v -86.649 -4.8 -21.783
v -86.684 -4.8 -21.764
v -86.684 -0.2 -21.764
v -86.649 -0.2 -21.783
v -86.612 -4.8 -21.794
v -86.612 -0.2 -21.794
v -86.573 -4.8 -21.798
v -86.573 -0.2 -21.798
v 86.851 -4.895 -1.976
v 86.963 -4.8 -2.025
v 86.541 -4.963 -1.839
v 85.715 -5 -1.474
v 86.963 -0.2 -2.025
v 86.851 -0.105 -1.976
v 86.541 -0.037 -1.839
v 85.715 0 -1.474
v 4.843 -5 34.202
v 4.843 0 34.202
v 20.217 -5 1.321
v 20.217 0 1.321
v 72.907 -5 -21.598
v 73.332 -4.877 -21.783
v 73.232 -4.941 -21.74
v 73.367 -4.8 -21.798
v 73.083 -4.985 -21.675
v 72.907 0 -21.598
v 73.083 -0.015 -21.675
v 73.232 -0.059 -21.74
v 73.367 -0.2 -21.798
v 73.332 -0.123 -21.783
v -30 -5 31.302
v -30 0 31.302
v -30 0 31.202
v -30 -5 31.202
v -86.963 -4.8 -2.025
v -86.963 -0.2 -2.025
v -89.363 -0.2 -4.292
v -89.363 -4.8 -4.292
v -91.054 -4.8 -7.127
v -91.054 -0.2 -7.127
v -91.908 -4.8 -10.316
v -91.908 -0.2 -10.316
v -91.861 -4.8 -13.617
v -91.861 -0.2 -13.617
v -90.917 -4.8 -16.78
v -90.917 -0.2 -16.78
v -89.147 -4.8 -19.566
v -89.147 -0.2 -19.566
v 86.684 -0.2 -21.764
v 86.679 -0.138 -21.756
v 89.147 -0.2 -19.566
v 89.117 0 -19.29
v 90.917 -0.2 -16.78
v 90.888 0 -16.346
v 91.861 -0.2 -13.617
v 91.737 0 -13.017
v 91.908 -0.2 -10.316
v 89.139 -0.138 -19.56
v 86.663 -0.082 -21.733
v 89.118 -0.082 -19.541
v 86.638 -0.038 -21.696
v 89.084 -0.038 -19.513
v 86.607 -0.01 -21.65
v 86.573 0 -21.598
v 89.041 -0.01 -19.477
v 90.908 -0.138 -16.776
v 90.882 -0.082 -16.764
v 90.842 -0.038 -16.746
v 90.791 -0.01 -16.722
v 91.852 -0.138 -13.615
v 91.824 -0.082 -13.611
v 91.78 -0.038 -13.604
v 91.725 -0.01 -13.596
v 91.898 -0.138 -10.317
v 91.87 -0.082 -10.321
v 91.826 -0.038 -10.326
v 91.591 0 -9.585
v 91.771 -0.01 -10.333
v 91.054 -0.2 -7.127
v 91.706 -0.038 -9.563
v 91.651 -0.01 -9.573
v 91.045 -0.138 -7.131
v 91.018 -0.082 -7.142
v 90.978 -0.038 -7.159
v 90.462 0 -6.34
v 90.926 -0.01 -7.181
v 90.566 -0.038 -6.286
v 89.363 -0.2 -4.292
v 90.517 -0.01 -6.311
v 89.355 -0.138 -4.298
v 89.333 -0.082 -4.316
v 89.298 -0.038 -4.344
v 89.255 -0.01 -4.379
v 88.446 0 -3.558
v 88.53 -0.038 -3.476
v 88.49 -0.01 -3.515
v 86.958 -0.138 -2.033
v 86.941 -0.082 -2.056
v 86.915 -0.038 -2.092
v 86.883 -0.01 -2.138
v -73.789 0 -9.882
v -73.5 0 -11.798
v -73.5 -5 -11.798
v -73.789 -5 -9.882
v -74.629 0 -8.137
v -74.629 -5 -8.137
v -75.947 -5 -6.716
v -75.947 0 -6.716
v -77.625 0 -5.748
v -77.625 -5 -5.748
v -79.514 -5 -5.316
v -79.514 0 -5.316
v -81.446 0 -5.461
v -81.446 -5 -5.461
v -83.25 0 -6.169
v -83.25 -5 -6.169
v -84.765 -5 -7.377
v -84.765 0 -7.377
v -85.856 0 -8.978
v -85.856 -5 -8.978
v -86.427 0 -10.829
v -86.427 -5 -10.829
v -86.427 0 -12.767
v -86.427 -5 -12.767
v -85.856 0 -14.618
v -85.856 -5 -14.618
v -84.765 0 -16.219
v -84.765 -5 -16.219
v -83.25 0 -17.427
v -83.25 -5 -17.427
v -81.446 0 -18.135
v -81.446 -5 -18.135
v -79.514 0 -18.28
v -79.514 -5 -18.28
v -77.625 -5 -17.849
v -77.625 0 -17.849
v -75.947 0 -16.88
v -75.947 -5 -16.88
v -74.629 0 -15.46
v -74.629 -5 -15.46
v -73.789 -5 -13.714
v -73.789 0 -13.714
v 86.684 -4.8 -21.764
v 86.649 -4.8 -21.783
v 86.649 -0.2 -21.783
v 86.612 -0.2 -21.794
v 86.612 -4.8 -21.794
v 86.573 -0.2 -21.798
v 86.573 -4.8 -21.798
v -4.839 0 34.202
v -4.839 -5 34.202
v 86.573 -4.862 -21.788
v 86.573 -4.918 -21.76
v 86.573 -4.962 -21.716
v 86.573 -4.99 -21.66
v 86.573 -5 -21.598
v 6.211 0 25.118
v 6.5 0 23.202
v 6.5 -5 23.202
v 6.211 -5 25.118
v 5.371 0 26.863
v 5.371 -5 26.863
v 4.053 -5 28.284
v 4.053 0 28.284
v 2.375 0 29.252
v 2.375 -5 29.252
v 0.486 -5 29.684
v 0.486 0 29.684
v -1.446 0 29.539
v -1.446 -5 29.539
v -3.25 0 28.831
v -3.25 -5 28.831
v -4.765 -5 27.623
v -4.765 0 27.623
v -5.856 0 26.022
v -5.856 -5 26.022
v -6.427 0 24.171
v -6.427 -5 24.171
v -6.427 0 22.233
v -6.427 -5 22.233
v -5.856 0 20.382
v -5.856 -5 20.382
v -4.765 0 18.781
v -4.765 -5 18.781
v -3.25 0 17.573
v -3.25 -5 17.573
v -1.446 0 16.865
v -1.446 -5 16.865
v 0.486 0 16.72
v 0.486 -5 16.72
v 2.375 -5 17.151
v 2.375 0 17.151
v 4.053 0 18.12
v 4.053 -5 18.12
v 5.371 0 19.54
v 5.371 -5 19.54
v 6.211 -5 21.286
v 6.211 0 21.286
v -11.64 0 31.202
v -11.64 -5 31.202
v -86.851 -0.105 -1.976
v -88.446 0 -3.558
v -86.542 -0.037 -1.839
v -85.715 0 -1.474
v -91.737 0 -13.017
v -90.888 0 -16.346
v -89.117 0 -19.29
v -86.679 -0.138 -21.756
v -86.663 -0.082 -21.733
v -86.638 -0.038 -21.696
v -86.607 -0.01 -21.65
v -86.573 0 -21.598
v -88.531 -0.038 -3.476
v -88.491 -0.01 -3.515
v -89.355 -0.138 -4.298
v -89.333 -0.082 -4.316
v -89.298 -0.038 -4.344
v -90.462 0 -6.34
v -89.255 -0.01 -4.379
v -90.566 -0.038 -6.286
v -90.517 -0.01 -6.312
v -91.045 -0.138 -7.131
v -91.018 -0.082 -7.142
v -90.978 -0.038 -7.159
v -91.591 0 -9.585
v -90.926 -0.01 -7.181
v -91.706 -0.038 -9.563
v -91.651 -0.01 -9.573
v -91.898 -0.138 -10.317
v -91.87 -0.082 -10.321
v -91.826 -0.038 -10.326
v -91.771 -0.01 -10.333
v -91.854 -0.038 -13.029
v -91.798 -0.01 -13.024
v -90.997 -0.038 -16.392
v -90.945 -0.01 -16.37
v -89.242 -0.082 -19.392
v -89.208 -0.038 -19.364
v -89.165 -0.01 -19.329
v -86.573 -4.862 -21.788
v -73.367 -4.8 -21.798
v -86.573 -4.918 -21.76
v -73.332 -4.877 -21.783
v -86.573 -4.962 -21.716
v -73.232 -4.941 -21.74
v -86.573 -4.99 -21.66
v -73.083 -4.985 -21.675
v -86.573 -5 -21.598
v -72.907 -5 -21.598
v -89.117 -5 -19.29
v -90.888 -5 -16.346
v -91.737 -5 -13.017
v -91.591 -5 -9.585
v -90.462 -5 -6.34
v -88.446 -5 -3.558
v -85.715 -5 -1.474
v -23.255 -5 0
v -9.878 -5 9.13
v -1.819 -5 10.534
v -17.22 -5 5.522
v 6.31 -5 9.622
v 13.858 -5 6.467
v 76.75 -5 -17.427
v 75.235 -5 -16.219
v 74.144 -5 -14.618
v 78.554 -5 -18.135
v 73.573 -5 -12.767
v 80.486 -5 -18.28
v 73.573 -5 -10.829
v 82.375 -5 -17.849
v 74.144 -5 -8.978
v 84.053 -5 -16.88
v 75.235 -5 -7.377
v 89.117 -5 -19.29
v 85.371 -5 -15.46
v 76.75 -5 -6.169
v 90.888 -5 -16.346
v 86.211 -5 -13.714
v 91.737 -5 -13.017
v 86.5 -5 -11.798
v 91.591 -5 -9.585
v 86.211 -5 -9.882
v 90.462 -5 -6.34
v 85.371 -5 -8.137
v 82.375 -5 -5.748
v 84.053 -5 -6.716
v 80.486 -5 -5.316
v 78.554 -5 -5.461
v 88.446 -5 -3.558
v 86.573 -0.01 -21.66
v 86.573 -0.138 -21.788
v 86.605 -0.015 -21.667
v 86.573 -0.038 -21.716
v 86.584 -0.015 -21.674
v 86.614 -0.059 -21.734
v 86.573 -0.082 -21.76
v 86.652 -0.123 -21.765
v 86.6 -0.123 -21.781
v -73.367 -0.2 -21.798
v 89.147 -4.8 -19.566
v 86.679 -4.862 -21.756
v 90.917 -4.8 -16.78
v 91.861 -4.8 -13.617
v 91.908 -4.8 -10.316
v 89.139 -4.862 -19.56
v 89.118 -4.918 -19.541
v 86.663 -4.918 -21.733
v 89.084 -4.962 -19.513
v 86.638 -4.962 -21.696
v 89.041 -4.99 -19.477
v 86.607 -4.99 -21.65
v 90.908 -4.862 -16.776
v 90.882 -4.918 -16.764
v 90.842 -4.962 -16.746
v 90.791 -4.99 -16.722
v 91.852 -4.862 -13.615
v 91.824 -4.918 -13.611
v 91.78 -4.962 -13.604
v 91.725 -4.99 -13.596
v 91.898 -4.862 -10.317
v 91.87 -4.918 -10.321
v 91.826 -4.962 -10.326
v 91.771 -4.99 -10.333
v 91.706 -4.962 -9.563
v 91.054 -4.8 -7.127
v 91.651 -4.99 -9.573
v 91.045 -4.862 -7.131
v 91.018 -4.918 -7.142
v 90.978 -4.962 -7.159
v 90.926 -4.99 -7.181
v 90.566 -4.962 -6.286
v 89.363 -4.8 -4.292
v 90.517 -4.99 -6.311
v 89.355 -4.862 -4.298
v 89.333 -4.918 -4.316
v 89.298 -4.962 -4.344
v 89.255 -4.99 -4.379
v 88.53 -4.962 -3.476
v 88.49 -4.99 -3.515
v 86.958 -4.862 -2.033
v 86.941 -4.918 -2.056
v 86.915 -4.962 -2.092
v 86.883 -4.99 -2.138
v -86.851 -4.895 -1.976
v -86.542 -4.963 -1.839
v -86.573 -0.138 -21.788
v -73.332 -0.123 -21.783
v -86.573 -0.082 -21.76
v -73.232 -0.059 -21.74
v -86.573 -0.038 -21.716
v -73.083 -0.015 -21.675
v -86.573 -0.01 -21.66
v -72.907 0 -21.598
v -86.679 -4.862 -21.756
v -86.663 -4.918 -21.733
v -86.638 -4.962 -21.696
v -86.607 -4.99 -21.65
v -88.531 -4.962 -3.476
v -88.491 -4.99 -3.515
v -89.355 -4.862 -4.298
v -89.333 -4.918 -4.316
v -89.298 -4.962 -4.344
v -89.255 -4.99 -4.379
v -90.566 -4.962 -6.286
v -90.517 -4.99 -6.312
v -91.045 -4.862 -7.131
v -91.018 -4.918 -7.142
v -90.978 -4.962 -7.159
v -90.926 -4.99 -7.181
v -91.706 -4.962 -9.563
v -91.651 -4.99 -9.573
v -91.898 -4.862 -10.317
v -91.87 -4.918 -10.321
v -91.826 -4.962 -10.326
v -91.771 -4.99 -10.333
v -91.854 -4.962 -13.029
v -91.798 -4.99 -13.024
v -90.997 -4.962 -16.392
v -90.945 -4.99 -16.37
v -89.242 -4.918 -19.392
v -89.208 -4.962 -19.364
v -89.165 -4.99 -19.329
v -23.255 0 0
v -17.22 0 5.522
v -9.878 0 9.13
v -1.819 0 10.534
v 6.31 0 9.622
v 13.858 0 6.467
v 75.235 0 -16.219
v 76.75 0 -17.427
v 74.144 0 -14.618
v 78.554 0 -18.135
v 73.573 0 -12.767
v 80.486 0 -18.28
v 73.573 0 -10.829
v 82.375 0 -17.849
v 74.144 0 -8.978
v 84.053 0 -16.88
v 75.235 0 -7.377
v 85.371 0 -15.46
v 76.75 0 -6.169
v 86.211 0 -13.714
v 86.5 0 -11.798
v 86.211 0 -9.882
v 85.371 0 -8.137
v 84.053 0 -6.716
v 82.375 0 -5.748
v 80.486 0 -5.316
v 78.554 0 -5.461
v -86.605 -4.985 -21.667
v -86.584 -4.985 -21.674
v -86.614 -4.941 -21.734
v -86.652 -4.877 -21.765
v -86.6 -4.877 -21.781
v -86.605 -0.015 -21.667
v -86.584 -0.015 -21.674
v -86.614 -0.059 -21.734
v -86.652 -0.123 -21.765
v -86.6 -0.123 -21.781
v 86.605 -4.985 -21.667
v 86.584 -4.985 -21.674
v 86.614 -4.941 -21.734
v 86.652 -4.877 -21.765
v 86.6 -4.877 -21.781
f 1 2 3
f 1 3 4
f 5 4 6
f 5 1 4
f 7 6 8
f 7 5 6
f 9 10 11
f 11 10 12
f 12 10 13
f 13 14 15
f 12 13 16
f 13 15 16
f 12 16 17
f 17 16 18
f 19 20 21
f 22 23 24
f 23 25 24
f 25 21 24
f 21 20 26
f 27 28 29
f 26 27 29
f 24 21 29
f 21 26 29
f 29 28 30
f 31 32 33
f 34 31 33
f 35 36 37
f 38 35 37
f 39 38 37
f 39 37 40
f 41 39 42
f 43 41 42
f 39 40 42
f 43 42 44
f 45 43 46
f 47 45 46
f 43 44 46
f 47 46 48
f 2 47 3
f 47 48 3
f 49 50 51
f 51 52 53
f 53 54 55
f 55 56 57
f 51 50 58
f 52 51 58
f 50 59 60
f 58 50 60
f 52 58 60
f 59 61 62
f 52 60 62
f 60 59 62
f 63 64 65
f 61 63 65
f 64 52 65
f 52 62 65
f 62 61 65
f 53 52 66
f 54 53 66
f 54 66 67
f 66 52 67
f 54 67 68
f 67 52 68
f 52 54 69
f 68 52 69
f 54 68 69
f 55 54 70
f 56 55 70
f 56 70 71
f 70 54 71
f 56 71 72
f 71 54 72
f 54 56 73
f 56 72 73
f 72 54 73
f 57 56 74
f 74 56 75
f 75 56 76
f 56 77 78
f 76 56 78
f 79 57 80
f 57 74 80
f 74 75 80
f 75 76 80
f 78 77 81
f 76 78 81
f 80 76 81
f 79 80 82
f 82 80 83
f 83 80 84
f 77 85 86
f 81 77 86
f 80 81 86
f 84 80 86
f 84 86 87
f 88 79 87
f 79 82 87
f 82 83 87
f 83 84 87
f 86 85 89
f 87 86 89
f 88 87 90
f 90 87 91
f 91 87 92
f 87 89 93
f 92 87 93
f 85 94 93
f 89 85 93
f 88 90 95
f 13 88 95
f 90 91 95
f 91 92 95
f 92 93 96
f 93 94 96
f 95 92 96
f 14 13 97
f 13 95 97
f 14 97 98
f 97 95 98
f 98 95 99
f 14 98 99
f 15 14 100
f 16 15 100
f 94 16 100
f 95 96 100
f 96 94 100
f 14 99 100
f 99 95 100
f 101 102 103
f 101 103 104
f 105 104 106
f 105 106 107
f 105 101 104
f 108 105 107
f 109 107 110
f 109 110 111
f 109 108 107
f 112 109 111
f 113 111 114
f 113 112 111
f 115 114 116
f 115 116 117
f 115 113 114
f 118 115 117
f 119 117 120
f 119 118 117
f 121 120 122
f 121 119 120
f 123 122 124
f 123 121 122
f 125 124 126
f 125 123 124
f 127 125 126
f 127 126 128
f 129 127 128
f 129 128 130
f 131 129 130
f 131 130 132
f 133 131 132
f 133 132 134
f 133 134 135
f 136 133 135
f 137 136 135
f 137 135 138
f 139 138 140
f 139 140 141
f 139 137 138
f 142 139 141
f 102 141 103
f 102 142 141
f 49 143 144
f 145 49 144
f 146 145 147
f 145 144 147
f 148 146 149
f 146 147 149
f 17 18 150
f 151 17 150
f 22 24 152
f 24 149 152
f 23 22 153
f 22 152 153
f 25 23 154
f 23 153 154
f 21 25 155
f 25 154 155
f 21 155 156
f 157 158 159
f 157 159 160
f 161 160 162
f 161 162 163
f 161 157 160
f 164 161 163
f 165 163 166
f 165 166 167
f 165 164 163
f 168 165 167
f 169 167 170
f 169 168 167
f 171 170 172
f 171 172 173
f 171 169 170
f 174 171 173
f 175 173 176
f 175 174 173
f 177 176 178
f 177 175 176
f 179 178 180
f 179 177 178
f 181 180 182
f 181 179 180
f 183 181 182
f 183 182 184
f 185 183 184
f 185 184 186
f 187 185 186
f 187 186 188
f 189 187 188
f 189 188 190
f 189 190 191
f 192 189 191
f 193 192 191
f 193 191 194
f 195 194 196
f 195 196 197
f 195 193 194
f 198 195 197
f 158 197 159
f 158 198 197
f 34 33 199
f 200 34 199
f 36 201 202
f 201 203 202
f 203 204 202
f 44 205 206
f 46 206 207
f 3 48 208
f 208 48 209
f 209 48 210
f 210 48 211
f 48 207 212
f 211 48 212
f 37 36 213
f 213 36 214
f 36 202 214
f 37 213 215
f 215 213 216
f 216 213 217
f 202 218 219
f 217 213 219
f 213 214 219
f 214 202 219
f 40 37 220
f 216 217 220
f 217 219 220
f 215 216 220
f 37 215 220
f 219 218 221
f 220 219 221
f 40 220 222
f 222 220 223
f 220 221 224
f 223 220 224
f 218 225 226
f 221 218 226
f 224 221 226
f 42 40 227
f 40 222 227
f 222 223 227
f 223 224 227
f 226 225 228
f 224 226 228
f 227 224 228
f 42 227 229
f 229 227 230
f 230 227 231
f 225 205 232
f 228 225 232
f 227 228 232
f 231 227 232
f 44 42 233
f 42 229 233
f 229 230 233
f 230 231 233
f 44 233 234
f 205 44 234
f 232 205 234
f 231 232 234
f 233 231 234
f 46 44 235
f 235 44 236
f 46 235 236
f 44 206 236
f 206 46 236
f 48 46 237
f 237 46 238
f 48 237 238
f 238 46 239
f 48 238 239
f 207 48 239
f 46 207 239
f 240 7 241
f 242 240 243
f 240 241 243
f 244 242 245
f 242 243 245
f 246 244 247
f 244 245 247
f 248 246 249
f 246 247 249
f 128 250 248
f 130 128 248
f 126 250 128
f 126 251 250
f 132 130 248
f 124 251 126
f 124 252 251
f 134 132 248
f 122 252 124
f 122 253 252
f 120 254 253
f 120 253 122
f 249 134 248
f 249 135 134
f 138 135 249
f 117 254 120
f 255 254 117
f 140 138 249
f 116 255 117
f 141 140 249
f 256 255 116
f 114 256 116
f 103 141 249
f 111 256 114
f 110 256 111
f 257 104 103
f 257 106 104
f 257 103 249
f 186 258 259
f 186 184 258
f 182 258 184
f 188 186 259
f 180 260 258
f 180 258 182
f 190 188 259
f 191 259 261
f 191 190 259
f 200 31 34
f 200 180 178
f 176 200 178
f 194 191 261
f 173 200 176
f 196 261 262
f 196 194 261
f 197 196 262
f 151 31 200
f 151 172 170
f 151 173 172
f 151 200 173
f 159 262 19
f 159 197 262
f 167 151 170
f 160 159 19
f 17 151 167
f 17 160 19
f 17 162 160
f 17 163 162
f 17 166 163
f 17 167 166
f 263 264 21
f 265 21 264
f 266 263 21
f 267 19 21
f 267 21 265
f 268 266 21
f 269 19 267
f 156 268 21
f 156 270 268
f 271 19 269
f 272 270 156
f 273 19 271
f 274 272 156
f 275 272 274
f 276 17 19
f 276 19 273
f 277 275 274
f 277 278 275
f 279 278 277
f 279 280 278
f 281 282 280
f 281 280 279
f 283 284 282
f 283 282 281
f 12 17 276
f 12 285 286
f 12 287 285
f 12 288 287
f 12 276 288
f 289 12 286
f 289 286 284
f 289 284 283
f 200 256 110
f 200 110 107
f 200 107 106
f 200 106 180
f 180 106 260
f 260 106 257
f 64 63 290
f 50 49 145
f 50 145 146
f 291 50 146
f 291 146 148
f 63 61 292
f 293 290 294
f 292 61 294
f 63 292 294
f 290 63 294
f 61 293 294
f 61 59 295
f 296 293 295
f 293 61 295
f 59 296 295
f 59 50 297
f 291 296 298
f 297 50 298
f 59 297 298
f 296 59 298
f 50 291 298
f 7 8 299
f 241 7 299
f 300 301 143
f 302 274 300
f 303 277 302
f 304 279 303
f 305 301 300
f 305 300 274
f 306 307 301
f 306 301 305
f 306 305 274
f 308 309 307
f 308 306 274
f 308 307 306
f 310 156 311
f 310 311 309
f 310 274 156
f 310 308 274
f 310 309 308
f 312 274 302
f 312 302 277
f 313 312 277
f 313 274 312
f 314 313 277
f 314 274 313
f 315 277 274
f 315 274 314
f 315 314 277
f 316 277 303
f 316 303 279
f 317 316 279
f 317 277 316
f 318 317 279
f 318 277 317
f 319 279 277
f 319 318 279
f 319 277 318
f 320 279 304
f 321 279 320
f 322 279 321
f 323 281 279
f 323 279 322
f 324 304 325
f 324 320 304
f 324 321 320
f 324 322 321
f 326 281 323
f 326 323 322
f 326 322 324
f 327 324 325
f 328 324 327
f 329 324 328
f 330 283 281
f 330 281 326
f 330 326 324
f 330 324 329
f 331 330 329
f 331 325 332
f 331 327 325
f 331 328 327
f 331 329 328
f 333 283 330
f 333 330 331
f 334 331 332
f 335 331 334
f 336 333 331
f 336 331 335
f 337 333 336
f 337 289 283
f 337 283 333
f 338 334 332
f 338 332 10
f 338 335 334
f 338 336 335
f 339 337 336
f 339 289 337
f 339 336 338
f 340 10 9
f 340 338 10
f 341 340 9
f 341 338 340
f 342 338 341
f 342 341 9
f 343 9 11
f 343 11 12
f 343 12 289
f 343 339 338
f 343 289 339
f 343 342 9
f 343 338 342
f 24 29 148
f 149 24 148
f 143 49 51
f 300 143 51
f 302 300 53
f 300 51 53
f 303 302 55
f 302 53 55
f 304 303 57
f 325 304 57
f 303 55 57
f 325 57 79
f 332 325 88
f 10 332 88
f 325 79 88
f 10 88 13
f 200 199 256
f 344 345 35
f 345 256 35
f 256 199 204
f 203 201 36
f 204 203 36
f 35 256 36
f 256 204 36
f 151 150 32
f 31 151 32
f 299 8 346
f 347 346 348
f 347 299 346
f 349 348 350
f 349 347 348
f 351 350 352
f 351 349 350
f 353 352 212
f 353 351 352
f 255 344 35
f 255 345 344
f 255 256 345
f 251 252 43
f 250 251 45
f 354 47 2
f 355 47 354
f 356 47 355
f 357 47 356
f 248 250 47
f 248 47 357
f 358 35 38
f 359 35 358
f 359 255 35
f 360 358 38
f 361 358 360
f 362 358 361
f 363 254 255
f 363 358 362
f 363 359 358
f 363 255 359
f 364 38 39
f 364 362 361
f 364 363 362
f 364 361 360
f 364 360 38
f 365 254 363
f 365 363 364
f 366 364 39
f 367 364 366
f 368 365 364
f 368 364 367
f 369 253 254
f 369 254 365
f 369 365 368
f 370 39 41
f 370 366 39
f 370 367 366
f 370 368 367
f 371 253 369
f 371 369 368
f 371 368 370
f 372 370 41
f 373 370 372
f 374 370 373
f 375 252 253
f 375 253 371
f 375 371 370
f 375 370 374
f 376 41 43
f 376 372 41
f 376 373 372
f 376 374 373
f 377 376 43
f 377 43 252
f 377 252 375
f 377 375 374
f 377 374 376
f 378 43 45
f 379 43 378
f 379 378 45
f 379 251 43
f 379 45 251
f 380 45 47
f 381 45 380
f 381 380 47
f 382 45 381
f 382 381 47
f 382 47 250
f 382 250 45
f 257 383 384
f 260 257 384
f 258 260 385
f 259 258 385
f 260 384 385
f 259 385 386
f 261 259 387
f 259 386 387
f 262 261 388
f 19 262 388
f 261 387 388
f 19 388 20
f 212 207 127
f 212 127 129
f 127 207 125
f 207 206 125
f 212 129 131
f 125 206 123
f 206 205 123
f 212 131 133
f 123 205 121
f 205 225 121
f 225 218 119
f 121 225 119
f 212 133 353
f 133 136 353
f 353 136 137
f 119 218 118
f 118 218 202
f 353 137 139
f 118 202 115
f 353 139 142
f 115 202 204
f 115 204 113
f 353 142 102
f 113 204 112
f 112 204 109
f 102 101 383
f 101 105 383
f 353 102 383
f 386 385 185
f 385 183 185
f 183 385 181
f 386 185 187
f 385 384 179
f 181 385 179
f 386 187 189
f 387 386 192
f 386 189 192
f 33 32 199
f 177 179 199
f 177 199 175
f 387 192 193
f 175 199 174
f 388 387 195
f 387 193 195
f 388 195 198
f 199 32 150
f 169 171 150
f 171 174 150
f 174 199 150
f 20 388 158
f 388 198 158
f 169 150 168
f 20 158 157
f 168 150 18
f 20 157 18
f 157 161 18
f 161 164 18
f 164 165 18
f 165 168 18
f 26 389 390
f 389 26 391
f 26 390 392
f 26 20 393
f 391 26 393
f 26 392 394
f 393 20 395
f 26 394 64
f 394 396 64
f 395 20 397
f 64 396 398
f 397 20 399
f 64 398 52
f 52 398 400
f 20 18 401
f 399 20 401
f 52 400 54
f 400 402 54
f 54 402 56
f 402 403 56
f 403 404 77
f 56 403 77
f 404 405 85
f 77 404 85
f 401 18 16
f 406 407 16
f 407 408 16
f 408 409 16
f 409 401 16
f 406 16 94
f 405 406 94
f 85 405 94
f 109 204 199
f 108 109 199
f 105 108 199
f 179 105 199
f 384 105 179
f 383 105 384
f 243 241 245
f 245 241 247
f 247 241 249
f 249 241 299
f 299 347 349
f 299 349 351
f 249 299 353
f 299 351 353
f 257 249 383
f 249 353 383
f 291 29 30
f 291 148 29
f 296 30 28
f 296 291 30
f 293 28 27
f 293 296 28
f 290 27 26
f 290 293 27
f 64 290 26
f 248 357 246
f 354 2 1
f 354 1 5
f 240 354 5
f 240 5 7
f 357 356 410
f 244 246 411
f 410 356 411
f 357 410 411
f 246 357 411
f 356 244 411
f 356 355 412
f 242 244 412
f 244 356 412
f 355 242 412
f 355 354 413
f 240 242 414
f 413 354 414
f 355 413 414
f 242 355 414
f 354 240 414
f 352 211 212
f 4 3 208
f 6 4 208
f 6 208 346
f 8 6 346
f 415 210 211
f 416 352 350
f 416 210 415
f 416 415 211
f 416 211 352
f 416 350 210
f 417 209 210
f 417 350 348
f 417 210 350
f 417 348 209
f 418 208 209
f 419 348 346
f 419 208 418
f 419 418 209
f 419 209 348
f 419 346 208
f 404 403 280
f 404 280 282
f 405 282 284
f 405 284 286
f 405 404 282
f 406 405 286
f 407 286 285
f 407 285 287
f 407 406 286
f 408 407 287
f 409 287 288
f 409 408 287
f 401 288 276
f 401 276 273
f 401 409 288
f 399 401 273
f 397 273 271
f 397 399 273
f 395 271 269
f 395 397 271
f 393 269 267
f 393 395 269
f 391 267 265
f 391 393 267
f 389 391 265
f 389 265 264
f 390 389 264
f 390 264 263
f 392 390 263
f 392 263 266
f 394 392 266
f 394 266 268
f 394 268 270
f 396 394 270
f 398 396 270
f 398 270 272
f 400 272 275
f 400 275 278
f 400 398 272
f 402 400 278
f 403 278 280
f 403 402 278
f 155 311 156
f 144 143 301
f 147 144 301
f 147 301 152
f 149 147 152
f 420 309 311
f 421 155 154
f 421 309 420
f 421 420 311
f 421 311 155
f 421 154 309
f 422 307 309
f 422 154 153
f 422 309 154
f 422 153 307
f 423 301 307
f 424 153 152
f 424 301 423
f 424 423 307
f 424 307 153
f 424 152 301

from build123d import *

# Parameters (mm, degrees)
F0_R     = 6.5
F1_DEPTH = 5
F3_R     = 0.2


# Not quite as in the source:
# - a feature of the source that left no trace in its solid (it failed there, or was rolled back) is left out


with BuildPart() as f1:
    # F0 (on Front) → F1 (new body)
    with BuildSketch(Plane.XZ):
        with BuildLine():
            Line((-11.6401047196, 31.2017867216), (-86.9632974703, -2.0251641974))
            ThreePointArc((-86.9632974703, -2.0251641974), (-91.998328651, -11.9984870467), (-86.6332495807, -21.7982132784))
            Line((-86.6332495807, -21.7982132784), (-73.3667504193, -21.7982132784))
            Line((-73.3667504193, -21.7982132784), (-23.2548427581, 0))
            ThreePointArc((-23.2548427581, 0), (-1.8189642808, 10.5340546664), (20.2171359245, 1.3213741908))
            Line((20.2171359245, 1.3213741908), (73.3667504193, -21.7982132784))
            Line((73.3667504193, -21.7982132784), (86.6332495807, -21.7982132784))
            ThreePointArc((86.6332495807, -21.7982132784), (91.998328651, -11.9984870467), (86.9632974703, -2.0251641974))
            Line((86.9632974703, -2.0251641974), (4.8428413091, 34.2017867216))
            Line((4.8428413091, 34.2017867216), (-4.8393128322, 34.2017867216))
            Line((-4.8393128322, 34.2017867216), (-30, 31.3017867216))
            Line((-30, 31.3017867216), (-30, 31.2017867216))
            Line((-30, 31.2017867216), (-11.6401047196, 31.2017867216))
        make_face()
        with Locations((-80, -11.7982132784)):
            Circle(F0_R, mode=Mode.SUBTRACT)
        with Locations((80, -11.7982132784)):
            Circle(F0_R, mode=Mode.SUBTRACT)
        with Locations((0, 23.2017867216)):
            Circle(F0_R, mode=Mode.SUBTRACT)
    extrude(amount=F1_DEPTH)

    # F3
    f3_edges = [f1.edges().sort_by_distance(p)[0] for p in [
        (80, -5, -21.798213),
        (80, 0, -21.798213),
        (-80, -5, -21.798213),
        (-80, 0, -21.798213),
        (-86.63325, -2.5, -21.798213),
        (-91.998329, 0, -11.998487),
        (-91.998329, -5, -11.998487),
        (86.63325, -2.5, -21.798213),
        (91.998329, 0, -11.998487),
        (91.998329, -5, -11.998487),
    ]]
    fillet(f3_edges, radius=F3_R)


solid = f1.part
